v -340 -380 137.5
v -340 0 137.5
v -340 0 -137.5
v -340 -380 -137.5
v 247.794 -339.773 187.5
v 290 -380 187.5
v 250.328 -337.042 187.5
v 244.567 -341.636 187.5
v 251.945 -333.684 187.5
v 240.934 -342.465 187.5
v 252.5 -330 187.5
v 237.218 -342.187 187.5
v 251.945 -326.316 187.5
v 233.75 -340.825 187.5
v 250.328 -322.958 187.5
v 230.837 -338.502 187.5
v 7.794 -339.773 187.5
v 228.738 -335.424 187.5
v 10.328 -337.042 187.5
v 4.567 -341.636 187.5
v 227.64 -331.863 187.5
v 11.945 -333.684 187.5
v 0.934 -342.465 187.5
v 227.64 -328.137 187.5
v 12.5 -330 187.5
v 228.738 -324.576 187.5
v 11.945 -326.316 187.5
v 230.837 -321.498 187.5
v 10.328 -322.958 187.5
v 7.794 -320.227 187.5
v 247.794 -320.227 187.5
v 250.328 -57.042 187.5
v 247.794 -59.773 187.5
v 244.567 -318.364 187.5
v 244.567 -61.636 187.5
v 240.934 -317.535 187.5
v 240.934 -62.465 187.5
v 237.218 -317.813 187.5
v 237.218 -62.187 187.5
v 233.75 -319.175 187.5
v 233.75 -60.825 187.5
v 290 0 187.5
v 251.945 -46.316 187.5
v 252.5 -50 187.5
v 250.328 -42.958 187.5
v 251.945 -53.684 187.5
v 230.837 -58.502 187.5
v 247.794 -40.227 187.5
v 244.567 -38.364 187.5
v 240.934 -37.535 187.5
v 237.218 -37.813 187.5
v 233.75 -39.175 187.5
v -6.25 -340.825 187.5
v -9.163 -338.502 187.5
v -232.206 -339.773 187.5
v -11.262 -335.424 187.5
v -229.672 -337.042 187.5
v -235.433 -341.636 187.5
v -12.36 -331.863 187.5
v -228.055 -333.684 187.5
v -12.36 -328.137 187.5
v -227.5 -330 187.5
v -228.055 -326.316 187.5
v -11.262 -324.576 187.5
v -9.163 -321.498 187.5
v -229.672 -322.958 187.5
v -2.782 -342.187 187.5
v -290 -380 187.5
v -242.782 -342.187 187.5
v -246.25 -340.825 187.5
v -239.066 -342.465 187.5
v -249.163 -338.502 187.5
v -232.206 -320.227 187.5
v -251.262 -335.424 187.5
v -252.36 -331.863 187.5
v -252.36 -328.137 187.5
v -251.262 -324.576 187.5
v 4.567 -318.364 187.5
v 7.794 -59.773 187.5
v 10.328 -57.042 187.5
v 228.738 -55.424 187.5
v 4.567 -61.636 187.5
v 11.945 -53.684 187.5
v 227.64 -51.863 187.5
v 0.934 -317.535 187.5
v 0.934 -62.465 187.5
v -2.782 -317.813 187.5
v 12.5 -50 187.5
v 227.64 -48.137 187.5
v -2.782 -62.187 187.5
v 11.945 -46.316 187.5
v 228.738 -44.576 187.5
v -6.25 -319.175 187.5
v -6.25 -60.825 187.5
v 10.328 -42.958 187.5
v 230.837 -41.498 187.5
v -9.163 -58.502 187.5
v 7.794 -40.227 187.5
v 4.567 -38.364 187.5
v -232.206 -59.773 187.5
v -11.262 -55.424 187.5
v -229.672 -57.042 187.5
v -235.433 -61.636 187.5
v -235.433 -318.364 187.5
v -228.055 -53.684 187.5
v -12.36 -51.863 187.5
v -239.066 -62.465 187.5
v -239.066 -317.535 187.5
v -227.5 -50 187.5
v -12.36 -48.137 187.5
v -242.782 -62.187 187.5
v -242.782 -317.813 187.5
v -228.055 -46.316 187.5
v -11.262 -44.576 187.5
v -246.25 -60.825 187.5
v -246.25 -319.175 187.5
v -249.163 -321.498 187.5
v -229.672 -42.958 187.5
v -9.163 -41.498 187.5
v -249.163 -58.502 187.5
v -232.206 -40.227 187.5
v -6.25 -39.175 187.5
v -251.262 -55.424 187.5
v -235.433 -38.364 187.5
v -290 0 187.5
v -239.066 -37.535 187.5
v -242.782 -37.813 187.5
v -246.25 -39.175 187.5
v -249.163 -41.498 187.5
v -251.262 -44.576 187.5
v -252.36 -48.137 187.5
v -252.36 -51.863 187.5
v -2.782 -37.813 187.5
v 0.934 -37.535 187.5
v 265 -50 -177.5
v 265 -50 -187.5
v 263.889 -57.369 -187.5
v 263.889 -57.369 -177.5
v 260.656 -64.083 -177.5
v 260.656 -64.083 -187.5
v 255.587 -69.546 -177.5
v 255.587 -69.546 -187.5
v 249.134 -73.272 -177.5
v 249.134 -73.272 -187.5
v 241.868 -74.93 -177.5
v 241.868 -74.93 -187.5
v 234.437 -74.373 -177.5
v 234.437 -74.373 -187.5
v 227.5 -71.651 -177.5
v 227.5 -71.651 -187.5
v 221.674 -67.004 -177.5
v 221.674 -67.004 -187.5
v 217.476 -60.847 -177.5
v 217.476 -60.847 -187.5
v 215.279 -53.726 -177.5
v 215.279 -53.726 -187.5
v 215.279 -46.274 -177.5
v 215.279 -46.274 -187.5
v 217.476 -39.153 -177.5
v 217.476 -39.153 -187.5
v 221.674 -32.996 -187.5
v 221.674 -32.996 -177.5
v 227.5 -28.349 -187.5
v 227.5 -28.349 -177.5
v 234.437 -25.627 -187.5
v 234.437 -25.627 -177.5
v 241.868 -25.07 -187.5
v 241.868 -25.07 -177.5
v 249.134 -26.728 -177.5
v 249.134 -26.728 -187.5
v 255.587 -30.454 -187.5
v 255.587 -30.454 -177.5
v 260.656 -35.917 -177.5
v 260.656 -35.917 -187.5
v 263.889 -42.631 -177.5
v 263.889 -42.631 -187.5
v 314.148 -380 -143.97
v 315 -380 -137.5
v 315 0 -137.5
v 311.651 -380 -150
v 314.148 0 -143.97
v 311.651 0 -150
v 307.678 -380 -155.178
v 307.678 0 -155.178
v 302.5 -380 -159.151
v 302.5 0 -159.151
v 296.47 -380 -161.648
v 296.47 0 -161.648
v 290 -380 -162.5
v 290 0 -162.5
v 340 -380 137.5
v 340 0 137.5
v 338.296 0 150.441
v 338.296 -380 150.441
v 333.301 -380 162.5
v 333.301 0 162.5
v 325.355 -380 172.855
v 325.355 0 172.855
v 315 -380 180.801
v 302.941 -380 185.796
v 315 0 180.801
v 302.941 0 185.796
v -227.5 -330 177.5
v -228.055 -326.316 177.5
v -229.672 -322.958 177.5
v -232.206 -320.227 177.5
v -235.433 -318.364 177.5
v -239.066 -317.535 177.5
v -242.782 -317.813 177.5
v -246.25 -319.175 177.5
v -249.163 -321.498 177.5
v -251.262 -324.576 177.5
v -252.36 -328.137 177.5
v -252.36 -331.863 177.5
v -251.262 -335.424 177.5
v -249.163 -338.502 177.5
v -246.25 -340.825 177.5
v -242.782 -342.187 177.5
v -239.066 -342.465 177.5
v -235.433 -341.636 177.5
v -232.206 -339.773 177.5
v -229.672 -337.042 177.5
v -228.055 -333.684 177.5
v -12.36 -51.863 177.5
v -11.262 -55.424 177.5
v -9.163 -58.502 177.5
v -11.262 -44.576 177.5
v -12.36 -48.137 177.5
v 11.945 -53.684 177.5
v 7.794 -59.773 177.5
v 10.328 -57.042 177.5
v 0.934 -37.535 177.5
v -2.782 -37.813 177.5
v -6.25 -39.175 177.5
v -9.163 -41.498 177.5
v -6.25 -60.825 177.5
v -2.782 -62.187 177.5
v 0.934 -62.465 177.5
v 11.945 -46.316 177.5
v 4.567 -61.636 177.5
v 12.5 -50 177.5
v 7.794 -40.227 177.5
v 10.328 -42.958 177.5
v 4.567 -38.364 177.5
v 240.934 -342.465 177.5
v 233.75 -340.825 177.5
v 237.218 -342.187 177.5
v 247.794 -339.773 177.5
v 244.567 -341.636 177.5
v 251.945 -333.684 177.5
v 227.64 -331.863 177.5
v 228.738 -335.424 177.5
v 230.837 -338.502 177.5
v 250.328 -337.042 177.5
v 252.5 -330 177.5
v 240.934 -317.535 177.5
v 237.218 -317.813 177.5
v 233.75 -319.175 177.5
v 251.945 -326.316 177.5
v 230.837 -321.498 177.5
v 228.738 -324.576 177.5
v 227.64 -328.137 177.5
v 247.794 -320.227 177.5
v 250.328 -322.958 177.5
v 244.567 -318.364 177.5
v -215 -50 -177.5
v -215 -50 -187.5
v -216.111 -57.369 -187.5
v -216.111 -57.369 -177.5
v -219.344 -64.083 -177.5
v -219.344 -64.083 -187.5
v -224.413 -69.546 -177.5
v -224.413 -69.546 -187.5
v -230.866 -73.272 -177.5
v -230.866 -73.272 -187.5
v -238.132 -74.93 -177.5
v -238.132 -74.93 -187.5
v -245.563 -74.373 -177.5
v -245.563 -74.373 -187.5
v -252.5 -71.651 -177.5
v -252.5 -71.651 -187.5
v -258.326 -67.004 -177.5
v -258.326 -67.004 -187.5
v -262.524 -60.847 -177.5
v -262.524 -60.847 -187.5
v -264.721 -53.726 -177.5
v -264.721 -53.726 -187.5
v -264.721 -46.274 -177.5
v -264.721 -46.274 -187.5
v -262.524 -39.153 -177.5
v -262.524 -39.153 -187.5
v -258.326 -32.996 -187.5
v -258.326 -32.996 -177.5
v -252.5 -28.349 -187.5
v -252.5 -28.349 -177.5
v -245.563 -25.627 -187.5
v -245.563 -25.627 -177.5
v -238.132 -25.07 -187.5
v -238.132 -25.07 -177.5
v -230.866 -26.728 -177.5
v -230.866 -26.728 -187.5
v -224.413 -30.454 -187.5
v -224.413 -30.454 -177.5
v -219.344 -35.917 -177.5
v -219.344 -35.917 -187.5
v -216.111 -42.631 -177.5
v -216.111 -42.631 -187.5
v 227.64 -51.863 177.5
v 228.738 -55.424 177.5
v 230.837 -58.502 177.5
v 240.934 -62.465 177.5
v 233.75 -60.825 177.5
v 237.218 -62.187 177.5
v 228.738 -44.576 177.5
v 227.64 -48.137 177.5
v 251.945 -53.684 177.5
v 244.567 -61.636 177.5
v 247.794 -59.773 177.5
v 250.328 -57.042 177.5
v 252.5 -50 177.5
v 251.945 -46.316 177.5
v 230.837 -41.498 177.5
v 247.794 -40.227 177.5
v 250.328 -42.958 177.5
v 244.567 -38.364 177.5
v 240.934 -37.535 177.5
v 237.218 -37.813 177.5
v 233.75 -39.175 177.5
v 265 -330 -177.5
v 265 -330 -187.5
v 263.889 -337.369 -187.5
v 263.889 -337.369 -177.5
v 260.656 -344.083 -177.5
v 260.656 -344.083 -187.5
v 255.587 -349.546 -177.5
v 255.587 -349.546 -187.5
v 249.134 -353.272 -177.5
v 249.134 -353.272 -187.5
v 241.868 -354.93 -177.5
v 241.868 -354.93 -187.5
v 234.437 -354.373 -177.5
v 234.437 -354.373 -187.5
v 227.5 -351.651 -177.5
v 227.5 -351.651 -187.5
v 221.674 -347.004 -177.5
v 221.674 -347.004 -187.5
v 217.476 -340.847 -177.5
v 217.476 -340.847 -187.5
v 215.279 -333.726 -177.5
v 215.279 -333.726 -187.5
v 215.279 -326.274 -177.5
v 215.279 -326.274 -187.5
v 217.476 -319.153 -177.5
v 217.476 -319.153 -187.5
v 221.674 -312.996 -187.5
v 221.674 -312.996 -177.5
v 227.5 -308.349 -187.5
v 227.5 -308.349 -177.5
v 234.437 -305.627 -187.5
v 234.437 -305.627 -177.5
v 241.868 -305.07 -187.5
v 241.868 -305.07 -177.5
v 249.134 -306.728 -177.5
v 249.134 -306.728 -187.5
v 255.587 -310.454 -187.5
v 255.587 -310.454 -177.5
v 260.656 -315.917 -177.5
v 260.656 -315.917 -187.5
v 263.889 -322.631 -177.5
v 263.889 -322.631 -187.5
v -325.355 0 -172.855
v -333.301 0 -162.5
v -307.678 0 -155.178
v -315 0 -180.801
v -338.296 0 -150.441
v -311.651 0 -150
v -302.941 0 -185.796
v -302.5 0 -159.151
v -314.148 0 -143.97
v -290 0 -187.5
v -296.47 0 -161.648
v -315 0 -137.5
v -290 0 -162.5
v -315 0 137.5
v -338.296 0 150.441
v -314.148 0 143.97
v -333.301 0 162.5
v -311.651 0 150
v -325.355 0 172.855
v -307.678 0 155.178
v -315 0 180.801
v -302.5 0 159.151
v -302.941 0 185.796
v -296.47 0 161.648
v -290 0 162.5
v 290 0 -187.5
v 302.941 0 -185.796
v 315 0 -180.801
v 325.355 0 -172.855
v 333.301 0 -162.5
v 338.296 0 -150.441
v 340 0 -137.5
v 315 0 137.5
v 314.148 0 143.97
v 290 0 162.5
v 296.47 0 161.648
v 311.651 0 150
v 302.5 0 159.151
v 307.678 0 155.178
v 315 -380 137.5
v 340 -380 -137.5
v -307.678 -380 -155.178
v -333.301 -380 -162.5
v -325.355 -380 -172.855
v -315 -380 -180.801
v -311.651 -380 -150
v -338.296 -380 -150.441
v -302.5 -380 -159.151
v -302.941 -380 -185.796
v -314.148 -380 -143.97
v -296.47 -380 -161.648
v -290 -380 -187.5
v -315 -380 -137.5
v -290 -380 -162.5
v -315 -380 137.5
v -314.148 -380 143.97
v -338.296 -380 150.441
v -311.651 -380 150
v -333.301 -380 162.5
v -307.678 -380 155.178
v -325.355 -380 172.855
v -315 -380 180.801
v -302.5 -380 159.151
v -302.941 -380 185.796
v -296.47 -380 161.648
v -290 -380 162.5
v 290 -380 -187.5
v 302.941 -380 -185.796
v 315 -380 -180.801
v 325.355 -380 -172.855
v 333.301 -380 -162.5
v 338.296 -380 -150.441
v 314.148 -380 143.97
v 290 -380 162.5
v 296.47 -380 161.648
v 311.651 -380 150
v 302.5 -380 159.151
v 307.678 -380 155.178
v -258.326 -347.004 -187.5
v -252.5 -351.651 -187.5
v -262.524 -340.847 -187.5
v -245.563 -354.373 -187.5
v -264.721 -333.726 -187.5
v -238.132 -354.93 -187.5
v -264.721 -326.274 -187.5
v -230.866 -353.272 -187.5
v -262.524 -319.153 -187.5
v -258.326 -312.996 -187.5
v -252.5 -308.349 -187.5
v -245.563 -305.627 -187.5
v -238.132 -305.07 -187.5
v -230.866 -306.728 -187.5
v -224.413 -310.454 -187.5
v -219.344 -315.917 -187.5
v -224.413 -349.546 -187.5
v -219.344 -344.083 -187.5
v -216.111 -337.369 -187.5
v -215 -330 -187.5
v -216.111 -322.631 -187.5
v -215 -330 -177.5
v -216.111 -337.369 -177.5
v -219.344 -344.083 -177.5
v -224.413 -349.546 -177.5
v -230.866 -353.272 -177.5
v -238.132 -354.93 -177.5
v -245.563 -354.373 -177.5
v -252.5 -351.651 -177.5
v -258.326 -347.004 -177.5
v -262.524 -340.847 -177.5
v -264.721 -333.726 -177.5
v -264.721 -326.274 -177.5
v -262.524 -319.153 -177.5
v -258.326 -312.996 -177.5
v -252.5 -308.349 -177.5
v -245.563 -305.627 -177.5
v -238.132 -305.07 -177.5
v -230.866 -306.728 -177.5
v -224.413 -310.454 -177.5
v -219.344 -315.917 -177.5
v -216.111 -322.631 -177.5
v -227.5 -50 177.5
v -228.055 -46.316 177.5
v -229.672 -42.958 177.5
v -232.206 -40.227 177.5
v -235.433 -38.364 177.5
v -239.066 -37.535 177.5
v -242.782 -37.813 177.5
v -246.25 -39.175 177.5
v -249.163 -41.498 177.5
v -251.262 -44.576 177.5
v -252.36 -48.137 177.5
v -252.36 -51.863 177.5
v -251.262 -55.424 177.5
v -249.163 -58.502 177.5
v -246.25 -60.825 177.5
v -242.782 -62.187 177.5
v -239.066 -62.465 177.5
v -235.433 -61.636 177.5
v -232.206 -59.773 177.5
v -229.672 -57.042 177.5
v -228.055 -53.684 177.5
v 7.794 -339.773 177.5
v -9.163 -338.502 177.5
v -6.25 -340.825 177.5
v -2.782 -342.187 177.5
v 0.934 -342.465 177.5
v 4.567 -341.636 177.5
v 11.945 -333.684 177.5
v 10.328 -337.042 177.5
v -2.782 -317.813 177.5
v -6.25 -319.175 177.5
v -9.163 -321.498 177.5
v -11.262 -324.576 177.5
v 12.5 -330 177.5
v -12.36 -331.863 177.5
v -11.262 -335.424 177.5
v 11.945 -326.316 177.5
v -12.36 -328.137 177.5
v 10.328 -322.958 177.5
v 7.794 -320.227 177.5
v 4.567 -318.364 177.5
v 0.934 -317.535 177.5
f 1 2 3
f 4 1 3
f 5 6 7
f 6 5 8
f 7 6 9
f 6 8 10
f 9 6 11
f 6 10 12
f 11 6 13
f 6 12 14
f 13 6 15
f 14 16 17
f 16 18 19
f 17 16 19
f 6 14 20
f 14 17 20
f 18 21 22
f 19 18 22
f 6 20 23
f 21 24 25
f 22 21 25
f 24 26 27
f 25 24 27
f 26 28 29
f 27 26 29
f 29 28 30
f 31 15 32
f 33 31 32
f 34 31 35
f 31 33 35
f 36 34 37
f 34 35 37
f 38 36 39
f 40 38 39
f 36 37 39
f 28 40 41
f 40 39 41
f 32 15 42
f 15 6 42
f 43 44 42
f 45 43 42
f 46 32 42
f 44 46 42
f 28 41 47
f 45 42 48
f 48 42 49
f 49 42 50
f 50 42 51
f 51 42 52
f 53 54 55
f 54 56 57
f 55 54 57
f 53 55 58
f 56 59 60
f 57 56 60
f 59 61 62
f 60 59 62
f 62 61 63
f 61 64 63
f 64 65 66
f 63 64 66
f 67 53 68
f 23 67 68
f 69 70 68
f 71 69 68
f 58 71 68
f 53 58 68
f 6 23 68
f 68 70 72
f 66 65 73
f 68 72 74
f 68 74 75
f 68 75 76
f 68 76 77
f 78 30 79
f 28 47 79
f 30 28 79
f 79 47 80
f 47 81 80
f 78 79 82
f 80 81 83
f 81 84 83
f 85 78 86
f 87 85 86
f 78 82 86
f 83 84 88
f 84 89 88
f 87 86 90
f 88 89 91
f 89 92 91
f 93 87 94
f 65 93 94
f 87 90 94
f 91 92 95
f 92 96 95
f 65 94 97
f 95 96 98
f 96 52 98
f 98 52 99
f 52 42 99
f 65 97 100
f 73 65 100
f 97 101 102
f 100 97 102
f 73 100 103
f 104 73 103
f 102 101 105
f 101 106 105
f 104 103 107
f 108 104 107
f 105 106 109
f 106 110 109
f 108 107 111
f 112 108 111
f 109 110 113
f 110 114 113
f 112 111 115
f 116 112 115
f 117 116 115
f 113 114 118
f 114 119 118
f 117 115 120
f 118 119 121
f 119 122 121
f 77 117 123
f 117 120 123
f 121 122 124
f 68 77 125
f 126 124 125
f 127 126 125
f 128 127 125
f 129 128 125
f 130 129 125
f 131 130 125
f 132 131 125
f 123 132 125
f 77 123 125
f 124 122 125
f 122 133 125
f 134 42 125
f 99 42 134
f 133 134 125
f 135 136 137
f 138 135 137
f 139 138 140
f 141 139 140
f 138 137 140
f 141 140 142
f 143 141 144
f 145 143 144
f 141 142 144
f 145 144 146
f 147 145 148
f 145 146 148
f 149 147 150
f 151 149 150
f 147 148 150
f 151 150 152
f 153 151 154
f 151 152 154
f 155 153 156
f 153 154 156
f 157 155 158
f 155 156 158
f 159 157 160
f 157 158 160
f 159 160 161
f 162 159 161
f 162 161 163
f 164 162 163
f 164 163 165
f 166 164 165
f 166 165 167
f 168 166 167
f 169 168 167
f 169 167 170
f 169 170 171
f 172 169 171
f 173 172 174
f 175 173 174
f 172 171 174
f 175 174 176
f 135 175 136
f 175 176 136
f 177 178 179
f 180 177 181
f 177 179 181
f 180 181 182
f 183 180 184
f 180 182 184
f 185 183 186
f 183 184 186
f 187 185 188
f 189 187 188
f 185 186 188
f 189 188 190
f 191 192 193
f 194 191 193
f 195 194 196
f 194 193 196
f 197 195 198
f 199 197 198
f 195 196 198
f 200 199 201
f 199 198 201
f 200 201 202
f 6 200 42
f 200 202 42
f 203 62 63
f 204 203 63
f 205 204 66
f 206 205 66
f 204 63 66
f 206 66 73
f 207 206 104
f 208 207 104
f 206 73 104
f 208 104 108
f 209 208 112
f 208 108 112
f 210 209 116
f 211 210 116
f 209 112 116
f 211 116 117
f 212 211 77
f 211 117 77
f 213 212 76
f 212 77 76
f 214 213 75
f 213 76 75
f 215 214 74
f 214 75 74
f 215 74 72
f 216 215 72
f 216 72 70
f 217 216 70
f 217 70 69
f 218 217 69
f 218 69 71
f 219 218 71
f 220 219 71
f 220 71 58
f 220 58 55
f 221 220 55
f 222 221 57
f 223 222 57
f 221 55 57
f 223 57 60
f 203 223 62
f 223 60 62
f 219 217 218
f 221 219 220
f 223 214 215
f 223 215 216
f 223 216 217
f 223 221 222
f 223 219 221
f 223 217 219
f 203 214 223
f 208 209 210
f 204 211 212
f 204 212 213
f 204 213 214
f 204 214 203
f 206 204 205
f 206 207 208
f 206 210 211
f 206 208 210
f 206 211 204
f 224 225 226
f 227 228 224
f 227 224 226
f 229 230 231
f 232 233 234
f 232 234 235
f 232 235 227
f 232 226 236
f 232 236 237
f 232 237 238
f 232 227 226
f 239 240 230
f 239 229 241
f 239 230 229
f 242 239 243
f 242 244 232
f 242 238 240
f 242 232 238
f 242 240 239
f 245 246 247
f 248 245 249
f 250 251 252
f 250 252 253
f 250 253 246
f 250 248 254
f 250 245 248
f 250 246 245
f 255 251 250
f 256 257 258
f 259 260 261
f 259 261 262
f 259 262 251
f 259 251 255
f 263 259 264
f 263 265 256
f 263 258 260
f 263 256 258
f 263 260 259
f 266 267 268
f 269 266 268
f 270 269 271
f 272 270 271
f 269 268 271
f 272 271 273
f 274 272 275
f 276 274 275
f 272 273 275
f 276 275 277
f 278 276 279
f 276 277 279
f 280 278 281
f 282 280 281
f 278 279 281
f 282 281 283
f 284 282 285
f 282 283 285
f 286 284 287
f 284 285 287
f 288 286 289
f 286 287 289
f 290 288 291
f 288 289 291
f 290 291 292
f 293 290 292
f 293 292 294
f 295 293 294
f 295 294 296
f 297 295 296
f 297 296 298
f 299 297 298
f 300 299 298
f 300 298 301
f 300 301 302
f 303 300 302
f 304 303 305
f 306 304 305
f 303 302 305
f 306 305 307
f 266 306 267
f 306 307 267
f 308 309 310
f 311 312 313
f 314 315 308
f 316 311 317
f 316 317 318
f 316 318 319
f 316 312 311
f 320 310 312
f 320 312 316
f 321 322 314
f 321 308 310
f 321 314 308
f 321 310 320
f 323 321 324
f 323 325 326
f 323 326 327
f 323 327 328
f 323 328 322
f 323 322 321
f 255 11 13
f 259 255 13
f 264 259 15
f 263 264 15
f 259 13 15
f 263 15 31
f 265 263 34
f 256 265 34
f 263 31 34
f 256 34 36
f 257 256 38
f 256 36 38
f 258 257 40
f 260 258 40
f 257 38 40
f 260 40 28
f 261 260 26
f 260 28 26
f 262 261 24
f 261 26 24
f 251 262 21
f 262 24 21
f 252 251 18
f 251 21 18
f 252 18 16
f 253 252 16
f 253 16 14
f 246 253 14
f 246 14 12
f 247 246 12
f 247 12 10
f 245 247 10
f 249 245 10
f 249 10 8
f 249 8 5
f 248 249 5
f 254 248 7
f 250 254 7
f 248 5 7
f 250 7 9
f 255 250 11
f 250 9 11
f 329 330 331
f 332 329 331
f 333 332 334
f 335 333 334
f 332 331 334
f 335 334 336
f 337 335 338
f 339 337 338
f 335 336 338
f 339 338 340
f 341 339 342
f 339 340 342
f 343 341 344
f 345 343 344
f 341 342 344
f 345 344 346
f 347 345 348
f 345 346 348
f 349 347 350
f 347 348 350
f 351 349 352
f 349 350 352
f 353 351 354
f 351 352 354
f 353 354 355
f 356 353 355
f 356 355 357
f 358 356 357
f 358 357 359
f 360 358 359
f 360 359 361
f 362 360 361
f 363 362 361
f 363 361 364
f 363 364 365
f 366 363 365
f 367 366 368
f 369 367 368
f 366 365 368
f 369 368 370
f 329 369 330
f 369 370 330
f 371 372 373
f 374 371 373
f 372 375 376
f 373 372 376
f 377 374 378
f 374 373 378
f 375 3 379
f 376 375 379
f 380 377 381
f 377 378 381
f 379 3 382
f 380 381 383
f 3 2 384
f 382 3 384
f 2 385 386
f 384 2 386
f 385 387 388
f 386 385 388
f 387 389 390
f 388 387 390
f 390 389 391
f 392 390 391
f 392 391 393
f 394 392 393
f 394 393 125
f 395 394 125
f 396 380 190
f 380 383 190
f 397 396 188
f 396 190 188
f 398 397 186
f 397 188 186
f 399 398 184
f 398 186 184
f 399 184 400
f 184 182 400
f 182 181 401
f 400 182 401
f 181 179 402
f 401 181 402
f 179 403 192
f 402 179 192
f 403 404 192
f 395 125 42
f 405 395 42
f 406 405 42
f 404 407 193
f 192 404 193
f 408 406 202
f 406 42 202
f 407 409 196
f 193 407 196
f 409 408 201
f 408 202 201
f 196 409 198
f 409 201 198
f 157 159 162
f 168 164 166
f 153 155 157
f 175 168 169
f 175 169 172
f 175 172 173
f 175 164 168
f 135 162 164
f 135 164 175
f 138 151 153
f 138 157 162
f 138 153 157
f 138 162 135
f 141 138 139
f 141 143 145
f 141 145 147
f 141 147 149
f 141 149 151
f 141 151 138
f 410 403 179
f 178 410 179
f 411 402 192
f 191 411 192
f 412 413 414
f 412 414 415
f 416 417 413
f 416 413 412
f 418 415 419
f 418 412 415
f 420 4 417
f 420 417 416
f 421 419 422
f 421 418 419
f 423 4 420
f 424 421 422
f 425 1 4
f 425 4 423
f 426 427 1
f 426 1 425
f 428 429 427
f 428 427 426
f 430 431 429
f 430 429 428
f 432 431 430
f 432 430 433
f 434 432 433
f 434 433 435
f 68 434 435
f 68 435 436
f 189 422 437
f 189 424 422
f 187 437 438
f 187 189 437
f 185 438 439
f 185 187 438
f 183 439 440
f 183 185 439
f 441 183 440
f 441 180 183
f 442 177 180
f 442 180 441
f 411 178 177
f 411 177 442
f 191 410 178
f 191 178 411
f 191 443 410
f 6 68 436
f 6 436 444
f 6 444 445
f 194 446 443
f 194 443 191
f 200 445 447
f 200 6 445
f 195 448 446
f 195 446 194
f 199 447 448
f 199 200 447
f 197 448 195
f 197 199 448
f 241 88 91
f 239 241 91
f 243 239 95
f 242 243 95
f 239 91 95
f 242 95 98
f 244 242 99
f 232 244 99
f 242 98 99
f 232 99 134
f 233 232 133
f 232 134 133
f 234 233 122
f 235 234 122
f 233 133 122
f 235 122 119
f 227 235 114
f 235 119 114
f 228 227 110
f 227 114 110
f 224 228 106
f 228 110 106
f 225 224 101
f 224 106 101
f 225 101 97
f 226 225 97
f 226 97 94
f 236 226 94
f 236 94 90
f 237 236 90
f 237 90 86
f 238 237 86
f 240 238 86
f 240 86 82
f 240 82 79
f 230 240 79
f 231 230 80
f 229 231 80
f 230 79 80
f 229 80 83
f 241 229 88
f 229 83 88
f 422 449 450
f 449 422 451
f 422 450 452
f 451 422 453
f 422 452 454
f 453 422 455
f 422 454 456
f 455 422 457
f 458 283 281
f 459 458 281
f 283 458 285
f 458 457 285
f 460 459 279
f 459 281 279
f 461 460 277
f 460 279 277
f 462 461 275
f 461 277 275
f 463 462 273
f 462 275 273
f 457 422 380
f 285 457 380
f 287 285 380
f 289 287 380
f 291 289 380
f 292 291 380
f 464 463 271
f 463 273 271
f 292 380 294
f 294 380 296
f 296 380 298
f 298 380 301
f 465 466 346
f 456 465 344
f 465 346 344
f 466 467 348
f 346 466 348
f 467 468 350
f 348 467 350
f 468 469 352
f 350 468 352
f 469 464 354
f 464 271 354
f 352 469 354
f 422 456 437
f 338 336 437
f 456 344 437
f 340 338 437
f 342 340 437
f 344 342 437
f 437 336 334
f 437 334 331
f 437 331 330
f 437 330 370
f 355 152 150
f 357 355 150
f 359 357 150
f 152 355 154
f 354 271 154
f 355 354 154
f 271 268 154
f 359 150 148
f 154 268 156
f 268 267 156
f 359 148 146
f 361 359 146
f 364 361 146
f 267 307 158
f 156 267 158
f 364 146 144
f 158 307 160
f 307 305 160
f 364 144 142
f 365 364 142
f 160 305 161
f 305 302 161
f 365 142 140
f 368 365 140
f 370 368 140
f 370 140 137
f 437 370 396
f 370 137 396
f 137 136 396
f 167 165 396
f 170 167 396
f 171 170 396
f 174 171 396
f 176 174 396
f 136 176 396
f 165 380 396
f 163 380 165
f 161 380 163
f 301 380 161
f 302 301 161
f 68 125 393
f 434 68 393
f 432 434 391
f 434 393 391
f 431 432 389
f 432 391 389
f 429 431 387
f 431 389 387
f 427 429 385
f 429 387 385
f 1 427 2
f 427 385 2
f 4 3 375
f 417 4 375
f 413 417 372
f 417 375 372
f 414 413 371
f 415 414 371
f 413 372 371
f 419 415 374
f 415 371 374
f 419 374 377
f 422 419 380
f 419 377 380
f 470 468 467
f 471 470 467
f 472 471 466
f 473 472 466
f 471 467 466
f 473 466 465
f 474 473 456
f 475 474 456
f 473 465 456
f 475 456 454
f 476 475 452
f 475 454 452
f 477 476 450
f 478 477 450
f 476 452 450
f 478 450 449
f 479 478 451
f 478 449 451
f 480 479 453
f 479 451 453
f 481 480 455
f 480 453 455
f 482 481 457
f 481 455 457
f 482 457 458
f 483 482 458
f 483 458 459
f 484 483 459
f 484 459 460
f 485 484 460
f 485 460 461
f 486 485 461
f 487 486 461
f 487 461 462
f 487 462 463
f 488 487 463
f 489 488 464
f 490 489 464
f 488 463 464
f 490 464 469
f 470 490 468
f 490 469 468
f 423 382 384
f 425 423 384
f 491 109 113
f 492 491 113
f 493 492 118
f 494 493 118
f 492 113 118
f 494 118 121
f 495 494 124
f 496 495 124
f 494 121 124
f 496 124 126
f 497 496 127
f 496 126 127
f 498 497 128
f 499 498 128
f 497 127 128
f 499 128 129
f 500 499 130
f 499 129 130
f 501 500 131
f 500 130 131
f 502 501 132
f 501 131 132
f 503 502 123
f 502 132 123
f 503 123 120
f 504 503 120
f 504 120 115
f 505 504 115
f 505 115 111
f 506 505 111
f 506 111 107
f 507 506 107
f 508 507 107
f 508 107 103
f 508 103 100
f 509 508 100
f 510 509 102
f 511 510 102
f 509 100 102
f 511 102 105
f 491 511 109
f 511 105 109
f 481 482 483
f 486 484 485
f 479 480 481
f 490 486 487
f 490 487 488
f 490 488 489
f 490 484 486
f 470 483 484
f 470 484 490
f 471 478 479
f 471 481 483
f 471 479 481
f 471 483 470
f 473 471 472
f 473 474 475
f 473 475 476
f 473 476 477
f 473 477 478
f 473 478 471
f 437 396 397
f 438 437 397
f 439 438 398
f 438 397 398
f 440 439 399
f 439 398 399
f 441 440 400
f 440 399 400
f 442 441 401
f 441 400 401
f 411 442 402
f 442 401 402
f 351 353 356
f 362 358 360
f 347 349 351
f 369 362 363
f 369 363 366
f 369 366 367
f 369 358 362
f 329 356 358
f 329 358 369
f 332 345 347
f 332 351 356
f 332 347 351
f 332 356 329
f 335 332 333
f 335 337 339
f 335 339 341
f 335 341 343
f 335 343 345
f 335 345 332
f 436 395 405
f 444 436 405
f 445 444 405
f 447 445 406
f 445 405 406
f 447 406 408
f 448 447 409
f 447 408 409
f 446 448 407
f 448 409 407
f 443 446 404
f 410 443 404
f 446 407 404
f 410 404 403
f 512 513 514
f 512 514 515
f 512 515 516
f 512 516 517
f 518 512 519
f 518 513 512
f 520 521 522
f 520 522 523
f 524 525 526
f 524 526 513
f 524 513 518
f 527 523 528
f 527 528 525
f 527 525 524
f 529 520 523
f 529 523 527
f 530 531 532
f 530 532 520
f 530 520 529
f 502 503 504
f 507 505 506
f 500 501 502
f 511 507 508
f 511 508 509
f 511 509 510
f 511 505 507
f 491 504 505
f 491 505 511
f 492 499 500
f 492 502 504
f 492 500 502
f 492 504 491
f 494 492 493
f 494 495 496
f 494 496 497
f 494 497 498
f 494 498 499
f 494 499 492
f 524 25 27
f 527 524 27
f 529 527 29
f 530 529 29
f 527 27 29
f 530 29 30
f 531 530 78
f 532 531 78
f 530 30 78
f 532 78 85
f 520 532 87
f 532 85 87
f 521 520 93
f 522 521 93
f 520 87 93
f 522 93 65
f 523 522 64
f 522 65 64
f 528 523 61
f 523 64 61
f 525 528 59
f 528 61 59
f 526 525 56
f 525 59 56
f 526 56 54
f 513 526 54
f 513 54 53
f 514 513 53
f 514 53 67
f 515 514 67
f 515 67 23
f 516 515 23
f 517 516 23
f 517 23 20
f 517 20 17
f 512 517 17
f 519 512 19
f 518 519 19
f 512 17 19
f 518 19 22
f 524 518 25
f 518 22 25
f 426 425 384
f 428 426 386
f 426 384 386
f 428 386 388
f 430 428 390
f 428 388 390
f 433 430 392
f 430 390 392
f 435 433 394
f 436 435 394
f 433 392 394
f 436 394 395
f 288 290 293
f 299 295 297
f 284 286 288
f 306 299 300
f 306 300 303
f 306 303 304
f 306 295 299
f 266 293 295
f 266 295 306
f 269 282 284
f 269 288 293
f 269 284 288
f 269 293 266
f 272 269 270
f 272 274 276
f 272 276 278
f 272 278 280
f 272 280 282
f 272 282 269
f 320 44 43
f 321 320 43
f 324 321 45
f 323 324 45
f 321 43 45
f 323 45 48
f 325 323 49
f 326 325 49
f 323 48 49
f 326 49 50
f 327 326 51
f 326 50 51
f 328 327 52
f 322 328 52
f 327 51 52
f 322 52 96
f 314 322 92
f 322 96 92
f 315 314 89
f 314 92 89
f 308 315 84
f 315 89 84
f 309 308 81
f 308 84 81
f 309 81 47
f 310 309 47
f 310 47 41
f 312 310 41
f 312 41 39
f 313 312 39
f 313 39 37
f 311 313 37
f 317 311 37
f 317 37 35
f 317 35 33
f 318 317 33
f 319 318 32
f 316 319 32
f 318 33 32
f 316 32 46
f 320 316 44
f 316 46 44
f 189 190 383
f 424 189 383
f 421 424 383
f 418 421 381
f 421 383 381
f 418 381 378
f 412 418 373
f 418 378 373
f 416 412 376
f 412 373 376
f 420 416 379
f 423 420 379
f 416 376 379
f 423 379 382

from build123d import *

# Parameters (mm, degrees)
F1_DEPTH = 380
F2_R     = 25
F3_DEPTH = 10
F4_R     = 12.5
F5_DEPTH = 10


with BuildPart() as f1:
    # F0 (on Front) → F1 (new body)
    with BuildSketch(Plane.XZ):
        with BuildLine():
            Line((-290, -187.5), (290, -187.5))
            ThreePointArc((290, -187.5), (325.355339, -172.855339), (340, -137.5))
            Line((340, -137.5), (340, 137.5))
            ThreePointArc((340, 137.5), (325.355339, 172.855339), (290, 187.5))
            Line((290, 187.5), (-290, 187.5))
            ThreePointArc((-290, 187.5), (-325.355339, 172.855339), (-340, 137.5))
            Line((-340, 137.5), (-340, -137.5))
            ThreePointArc((-340, -137.5), (-325.355339, -172.855339), (-290, -187.5))
        make_face()
        with BuildLine():
            ThreePointArc((315, -137.5), (307.67767, -155.17767), (290, -162.5))
            Line((290, -162.5), (-290, -162.5))
            ThreePointArc((-290, -162.5), (-307.67767, -155.17767), (-315, -137.5))
            Line((-315, -137.5), (-315, 137.5))
            ThreePointArc((-315, 137.5), (-307.67767, 155.17767), (-290, 162.5))
            Line((-290, 162.5), (290, 162.5))
            ThreePointArc((290, 162.5), (307.67767, 155.17767), (315, 137.5))
            Line((315, 137.5), (315, -137.5))
        make_face(mode=Mode.SUBTRACT)
    extrude(amount=F1_DEPTH)

    # F2 (on face) → F3 (cut)
    with BuildSketch(Plane(origin=(0, 0, -187.5), x_dir=(1, 0, 0), z_dir=(0, 0, -1))):
        with Locations((-240, 330)):
            Circle(F2_R)
        with Locations((-240, 50)):
            Circle(F2_R)
        with Locations((240, 50)):
            Circle(F2_R)
        with Locations((240, 330)):
            Circle(F2_R)
    extrude(amount=-F3_DEPTH, mode=Mode.SUBTRACT)

    # F4 (on face) → F5 (cut)
    with BuildSketch(Plane.XY.offset(187.5)):
        with Locations((-240, -330)):
            Circle(F4_R)
        with Locations((-240, -50)):
            Circle(F4_R)
        with Locations((0, -330)):
            Circle(F4_R)
        with Locations((0, -50)):
            Circle(F4_R)
        with Locations((240, -330)):
            Circle(F4_R)
        with Locations((240, -50)):
            Circle(F4_R)
    extrude(amount=-F5_DEPTH, mode=Mode.SUBTRACT)


solid = f1.part
